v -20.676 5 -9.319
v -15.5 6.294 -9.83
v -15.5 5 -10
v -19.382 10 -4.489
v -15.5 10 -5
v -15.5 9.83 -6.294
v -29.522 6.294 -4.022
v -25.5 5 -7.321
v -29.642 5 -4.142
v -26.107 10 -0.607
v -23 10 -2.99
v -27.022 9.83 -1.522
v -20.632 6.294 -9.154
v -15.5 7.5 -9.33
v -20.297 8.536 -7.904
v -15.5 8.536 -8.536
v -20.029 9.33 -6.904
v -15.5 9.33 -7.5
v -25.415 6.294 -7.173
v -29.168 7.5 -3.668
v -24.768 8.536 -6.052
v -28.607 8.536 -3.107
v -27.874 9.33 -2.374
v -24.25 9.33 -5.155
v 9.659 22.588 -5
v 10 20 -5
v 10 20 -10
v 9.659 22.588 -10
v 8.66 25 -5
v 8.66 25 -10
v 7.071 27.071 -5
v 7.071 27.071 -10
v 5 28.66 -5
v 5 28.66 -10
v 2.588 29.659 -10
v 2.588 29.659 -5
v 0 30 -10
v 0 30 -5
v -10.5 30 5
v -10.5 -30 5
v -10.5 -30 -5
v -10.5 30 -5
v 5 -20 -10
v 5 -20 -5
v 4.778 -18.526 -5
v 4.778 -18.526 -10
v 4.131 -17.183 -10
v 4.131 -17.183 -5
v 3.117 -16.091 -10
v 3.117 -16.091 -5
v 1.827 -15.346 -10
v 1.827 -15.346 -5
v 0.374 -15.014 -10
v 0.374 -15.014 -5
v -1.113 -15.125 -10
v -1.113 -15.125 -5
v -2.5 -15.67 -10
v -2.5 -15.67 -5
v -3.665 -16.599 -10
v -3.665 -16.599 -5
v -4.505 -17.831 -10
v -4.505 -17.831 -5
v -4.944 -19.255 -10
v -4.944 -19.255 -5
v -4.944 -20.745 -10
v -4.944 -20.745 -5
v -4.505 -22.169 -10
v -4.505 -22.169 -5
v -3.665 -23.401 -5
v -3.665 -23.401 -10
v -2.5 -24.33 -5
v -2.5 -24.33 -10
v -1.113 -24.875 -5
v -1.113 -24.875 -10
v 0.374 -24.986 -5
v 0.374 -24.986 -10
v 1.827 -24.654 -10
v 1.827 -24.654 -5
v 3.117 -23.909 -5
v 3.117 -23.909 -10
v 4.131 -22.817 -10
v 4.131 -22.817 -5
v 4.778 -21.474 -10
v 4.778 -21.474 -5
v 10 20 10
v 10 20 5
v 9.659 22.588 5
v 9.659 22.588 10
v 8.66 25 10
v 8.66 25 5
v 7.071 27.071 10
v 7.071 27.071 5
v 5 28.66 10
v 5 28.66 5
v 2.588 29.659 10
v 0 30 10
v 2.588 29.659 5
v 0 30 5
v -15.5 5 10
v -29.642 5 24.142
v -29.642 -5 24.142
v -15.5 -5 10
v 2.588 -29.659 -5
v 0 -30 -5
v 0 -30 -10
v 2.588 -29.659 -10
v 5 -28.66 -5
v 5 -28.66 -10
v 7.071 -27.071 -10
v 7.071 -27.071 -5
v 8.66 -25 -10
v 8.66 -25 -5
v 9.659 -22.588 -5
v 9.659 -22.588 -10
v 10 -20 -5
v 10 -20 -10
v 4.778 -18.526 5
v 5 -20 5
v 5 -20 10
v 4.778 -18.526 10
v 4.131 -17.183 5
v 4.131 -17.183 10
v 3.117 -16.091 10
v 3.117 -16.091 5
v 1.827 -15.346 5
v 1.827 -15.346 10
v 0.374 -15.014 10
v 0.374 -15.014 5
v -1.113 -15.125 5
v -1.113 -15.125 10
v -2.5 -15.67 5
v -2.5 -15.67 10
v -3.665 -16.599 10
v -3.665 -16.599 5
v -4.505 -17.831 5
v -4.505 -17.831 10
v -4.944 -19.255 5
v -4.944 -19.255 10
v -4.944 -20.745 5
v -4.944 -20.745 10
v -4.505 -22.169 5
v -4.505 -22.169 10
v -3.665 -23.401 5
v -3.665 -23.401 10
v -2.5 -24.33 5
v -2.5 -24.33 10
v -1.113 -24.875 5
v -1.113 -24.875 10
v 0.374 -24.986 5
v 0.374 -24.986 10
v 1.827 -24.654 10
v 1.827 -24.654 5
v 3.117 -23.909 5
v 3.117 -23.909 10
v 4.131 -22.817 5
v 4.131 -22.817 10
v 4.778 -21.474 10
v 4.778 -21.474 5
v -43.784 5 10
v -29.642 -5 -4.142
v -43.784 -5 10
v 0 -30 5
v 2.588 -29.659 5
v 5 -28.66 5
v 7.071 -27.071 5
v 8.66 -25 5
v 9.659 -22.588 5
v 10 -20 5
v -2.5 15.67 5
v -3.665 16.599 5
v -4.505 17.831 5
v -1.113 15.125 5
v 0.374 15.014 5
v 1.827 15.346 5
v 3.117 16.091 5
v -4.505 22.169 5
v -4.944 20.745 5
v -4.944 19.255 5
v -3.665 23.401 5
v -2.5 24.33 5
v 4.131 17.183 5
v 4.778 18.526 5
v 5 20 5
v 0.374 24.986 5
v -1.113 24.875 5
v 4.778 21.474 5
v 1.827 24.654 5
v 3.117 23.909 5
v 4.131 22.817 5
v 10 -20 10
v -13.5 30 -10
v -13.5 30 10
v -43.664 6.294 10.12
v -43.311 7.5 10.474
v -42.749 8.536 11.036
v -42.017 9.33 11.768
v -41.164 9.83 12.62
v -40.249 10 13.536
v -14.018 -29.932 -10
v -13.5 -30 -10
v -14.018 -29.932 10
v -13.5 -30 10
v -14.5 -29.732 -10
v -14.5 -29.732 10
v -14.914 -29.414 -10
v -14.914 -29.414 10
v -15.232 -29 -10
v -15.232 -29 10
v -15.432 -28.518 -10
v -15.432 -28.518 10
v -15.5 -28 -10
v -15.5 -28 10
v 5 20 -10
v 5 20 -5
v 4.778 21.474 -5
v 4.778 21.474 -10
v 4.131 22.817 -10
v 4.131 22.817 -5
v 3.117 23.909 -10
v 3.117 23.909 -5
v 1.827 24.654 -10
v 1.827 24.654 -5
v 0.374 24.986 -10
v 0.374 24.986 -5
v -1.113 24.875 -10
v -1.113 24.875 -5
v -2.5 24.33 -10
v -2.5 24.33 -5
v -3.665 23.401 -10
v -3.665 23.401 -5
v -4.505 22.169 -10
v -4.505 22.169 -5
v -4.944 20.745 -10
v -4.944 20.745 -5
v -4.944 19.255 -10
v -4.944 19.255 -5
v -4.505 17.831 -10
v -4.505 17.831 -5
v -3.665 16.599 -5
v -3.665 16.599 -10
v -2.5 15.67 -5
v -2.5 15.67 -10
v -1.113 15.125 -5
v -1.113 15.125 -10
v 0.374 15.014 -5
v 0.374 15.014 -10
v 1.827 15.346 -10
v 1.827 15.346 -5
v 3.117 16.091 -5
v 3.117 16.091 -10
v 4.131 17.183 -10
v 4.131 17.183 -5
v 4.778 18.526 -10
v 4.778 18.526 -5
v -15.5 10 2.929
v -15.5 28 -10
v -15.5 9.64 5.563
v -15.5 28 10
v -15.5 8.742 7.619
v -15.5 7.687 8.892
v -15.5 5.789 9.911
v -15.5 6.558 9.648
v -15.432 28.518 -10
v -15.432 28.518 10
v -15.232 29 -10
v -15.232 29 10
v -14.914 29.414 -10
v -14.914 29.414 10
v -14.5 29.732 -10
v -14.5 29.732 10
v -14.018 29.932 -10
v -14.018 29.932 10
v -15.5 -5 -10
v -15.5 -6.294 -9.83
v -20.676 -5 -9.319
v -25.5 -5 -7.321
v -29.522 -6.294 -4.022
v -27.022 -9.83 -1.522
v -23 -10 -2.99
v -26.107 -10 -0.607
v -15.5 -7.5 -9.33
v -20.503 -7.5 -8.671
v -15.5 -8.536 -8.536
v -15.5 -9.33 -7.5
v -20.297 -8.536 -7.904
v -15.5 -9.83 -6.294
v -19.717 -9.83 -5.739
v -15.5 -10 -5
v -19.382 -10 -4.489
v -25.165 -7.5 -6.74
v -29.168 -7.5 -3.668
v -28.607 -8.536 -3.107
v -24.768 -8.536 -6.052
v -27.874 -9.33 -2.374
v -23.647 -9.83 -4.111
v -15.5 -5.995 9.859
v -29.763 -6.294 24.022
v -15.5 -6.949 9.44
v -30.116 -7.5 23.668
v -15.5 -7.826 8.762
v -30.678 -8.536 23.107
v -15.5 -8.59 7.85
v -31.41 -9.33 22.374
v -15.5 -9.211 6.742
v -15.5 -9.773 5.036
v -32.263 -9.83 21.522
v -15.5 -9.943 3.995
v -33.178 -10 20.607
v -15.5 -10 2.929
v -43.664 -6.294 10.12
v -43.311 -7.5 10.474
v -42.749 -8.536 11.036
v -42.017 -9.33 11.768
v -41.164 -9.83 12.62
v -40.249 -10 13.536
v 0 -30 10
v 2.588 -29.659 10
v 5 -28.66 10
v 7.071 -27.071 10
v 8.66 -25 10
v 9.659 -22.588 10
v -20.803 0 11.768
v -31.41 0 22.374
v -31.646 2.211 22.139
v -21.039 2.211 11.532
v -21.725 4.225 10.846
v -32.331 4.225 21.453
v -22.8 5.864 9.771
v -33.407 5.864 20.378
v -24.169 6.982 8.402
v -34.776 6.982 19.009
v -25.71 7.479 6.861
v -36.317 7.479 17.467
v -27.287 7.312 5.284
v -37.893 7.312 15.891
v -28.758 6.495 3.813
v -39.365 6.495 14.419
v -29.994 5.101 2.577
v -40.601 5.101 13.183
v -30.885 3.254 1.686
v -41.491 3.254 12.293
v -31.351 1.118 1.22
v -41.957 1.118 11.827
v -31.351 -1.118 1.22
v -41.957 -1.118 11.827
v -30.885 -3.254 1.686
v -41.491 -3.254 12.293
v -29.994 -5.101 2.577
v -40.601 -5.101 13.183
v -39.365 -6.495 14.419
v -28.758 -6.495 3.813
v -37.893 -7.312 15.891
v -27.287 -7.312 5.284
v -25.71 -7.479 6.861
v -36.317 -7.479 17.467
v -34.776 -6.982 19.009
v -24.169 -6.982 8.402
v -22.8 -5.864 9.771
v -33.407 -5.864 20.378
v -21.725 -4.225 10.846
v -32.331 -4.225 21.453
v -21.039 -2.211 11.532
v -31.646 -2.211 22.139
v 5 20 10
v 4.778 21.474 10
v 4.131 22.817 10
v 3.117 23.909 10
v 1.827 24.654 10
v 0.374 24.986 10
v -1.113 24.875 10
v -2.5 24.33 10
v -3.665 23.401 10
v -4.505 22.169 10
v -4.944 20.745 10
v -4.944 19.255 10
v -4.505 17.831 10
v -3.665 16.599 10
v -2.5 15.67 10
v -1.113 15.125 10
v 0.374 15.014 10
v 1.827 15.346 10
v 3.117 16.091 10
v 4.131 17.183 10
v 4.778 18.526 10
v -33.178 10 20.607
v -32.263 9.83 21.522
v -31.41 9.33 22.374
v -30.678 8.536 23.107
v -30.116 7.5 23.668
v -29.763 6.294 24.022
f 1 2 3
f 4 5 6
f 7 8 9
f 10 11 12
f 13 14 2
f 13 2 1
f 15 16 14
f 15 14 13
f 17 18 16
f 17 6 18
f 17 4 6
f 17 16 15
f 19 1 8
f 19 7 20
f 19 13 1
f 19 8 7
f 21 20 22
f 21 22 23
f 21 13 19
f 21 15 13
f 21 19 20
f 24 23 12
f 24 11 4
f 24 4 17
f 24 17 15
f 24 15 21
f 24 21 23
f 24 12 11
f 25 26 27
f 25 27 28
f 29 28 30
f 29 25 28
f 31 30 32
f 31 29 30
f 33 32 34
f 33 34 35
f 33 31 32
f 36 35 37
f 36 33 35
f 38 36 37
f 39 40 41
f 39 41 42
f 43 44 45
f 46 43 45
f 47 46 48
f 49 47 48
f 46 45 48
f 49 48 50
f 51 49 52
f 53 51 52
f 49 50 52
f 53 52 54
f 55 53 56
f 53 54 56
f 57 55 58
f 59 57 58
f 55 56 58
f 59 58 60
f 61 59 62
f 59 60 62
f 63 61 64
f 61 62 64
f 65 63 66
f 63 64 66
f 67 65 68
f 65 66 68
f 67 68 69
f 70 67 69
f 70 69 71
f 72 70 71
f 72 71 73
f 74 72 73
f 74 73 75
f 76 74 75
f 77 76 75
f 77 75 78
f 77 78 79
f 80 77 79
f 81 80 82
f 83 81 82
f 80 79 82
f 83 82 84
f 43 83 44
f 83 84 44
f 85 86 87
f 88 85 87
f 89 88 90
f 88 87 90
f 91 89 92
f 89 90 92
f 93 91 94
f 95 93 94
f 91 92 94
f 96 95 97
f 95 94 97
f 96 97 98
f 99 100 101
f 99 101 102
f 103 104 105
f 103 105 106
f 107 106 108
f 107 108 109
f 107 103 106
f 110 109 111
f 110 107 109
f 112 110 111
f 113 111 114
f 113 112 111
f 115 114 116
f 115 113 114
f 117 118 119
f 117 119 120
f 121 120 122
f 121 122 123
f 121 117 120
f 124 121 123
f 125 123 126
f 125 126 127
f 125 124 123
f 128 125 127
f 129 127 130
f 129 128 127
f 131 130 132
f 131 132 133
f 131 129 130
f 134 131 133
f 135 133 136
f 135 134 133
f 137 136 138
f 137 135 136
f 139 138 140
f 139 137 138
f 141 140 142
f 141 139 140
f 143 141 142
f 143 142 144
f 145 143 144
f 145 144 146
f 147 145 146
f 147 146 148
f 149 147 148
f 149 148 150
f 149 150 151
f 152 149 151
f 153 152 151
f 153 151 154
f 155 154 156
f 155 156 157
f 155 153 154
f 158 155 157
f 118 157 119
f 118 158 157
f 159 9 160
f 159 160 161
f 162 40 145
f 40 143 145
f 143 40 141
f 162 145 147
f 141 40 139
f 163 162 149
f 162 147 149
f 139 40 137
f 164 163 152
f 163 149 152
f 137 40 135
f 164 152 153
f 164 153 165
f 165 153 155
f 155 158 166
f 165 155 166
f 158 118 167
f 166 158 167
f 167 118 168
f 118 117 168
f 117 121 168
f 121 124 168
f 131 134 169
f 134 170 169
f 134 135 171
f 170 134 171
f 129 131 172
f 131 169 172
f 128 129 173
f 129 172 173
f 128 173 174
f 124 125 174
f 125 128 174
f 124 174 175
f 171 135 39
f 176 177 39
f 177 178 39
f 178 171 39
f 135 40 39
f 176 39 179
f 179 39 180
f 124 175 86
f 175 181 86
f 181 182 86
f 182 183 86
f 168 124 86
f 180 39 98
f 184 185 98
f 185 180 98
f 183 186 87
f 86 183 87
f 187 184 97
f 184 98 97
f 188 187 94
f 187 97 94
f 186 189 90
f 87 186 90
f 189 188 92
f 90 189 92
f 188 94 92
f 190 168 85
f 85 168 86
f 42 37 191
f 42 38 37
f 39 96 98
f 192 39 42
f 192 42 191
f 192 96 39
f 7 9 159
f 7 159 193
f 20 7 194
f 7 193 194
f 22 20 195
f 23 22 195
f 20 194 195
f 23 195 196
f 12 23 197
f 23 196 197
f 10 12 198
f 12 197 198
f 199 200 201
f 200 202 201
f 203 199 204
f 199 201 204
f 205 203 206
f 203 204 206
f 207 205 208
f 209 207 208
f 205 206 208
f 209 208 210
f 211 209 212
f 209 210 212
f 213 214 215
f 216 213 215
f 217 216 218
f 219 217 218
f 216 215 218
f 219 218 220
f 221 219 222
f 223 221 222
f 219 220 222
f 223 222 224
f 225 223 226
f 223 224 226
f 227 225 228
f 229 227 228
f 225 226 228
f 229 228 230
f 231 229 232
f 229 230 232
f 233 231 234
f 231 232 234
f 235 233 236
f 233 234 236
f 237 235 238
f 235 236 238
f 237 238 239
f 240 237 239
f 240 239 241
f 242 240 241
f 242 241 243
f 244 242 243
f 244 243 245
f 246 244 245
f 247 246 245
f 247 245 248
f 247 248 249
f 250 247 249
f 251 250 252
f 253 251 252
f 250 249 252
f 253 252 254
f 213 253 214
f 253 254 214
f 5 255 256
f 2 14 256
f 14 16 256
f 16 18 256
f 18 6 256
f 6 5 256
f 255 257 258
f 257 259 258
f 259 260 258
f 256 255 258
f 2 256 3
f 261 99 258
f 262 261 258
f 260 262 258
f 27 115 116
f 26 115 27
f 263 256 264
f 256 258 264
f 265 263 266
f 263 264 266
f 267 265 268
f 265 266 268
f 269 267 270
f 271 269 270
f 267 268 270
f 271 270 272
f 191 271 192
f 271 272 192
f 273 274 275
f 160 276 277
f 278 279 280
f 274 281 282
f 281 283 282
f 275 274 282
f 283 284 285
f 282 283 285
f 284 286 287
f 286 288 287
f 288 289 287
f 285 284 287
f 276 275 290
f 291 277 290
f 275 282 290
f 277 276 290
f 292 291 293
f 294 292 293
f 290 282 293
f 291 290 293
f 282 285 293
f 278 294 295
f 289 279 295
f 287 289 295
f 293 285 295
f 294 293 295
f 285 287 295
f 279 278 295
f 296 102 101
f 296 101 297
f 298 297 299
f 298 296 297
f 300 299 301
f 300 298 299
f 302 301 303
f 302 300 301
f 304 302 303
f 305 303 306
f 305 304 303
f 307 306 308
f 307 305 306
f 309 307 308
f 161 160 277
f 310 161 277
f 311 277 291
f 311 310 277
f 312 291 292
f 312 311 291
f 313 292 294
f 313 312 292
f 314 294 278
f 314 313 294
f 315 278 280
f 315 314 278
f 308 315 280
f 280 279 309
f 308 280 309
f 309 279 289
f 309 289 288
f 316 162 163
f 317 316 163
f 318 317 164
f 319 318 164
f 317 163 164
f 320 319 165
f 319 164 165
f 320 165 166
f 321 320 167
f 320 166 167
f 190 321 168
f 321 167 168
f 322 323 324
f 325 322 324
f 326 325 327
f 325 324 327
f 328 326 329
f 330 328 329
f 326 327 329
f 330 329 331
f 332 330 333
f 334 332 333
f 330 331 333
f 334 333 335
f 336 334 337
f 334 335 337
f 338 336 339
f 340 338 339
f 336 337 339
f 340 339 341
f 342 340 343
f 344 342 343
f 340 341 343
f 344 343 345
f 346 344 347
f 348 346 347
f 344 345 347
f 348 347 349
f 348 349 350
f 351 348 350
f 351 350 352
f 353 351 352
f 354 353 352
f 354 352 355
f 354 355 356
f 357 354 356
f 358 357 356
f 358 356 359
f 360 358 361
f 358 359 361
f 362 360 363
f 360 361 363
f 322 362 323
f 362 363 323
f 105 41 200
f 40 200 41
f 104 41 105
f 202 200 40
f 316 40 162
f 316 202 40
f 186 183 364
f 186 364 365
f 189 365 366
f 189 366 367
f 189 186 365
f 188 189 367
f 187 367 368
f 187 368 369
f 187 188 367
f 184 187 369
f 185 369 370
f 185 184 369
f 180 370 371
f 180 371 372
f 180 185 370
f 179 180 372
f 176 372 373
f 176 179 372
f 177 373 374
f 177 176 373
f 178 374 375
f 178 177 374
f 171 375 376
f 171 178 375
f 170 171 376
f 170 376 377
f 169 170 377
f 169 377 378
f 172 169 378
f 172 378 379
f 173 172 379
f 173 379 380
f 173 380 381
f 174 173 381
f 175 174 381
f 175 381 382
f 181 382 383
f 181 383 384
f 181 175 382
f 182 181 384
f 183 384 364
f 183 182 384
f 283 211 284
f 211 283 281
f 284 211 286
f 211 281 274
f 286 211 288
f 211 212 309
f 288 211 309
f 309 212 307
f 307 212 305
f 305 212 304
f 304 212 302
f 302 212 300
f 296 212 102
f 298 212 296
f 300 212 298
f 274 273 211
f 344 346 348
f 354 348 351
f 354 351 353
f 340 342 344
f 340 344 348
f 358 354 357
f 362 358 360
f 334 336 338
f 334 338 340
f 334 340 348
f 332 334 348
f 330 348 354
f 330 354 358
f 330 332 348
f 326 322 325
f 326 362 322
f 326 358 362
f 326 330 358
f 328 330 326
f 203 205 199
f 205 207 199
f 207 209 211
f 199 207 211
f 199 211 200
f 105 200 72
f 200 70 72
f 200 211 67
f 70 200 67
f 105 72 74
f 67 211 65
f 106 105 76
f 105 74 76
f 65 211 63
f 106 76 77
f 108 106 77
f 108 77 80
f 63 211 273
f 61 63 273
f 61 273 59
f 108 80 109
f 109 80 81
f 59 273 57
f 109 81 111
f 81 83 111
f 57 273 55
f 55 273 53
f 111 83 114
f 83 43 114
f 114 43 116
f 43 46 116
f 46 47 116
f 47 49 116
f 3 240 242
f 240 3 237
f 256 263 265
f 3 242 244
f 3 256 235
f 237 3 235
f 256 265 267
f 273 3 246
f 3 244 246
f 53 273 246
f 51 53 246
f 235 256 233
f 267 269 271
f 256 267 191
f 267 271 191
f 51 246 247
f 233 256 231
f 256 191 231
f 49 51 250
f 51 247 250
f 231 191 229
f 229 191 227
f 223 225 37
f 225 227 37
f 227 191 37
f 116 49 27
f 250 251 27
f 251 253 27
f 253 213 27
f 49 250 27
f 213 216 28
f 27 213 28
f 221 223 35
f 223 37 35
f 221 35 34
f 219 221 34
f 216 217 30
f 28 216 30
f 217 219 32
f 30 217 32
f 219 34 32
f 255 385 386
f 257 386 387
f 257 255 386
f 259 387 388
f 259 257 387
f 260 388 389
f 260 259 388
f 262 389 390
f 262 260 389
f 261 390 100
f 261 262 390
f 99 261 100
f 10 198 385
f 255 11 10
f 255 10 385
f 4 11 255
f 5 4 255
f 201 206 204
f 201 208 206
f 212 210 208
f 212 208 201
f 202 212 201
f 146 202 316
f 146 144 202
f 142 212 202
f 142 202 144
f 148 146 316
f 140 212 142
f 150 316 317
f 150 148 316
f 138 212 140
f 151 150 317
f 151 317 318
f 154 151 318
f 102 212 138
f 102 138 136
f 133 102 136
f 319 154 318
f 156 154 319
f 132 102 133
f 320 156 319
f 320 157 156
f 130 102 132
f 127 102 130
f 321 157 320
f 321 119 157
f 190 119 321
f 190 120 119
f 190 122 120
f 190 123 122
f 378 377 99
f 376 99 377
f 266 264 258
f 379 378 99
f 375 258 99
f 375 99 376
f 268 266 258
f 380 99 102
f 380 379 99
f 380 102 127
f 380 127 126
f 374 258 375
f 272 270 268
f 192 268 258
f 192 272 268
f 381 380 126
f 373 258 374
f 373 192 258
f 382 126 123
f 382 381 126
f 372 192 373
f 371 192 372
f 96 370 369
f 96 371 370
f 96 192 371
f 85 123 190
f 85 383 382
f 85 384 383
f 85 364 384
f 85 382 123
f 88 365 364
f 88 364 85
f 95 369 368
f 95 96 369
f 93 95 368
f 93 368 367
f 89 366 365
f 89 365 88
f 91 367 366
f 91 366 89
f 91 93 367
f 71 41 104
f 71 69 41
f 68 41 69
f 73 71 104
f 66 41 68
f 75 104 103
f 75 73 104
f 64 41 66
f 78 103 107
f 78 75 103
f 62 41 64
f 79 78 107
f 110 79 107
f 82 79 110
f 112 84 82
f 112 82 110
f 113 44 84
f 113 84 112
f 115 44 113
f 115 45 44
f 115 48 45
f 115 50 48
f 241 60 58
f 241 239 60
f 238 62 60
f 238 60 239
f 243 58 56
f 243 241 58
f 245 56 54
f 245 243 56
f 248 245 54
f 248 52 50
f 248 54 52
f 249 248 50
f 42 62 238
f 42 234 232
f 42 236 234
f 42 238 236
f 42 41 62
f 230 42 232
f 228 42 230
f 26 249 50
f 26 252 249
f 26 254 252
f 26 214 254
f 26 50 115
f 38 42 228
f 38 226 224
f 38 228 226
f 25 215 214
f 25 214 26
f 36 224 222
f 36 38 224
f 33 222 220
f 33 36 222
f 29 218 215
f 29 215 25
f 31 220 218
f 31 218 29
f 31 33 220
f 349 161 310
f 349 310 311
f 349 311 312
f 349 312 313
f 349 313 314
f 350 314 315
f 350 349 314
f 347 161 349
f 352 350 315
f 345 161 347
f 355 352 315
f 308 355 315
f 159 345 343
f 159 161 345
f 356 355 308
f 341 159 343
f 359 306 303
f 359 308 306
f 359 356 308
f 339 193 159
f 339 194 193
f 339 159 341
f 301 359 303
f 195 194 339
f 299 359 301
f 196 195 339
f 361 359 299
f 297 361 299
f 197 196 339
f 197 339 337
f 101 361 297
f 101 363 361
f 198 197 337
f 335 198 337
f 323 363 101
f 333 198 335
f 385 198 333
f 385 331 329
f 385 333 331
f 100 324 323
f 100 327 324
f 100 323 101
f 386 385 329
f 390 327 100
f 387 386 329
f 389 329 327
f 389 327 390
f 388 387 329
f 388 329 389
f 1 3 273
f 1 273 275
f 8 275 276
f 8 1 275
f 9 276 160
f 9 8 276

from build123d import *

# Parameters (mm, degrees)
SKETCH1_W           = 5
SKETCH1_H           = 60
BOSS_EXTRUDE1_DEPTH = 5
BOSS_EXTRUDE2_START = 5
SKETCH1_3_R         = 5
SKETCH1_3_W         = 5
SKETCH1_3_H         = 60
BOSS_EXTRUDE2_DEPTH = 5
BOSS_EXTRUDE3_START = -5
SKETCH1_4_R         = 5
SKETCH1_4_W         = 5
SKETCH1_4_H         = 60
BOSS_EXTRUDE3_DEPTH = 5
BOSS_EXTRUDE4_DEPTH = 10
FILLET3_R           = 5
FILLET2_R           = 2
SKETCH4_R           = 7.5
CUT_EXTRUDE1_DEPTH  = 15


with BuildPart() as part:
    # Sketch1 → Boss-Extrude1 (new body, symmetric)
    with BuildSketch(Plane.XY):
        with Locations((-13, 0)):
            Rectangle(SKETCH1_W, SKETCH1_H)
    extrude(amount=BOSS_EXTRUDE1_DEPTH, both=True)

    # Sketch1<3> → Boss-Extrude2 (add)
    with BuildSketch(Plane.XY.offset(BOSS_EXTRUDE2_START)):
        with BuildLine():
            Line((0, 30), (-10.5, 30))
            Line((-10.5, 30), (-10.5, -30))
            Line((-10.5, -30), (0, -30))
            ThreePointArc((0, -30), (7.071067812, -27.071067812), (10, -20))
            Line((10, -20), (10, 20))
            ThreePointArc((10, 20), (7.071067812, 27.071067812), (0, 30))
        make_face()
        with Locations((0, -20)):
            Circle(SKETCH1_3_R, mode=Mode.SUBTRACT)
        with Locations((0, 20)):
            Circle(SKETCH1_3_R, mode=Mode.SUBTRACT)
        with Locations((-13, 0)):
            Rectangle(SKETCH1_3_W, SKETCH1_3_H)
    extrude(amount=BOSS_EXTRUDE2_DEPTH)

    # Sketch1<4> → Boss-Extrude3 (add)
    with BuildSketch(Plane.XY.offset(BOSS_EXTRUDE3_START)):
        with BuildLine():
            Line((0, 30), (-10.5, 30))
            Line((-10.5, 30), (-10.5, -30))
            Line((-10.5, -30), (0, -30))
            ThreePointArc((0, -30), (7.071067812, -27.071067812), (10, -20))
            Line((10, -20), (10, 20))
            ThreePointArc((10, 20), (7.071067812, 27.071067812), (0, 30))
        make_face()
        with Locations((0, -20)):
            Circle(SKETCH1_4_R, mode=Mode.SUBTRACT)
        with Locations((0, 20)):
            Circle(SKETCH1_4_R, mode=Mode.SUBTRACT)
        with Locations((-13, 0)):
            Rectangle(SKETCH1_4_W, SKETCH1_4_H)
    extrude(amount=-BOSS_EXTRUDE3_DEPTH)

    # Sketch3 → Boss-Extrude4 (add, symmetric)
    with BuildSketch(Plane(origin=(0, 0, 0), x_dir=(1, 0, 0), z_dir=(0, 1, 0))):
        with BuildLine():
            Line((-15.5, -10), (-15.5, 10))
            ThreePointArc((-15.5, 10), (-23.153668647, 8.47759065), (-29.642135624, 4.142135624))
            Line((-29.642135624, 4.142135624), (-43.784271247, -10))
            Line((-43.784271247, -10), (-29.642135624, -24.142135624))
            Line((-29.642135624, -24.142135624), (-15.5, -10))
        make_face()
    extrude(amount=BOSS_EXTRUDE4_DEPTH, both=True)

    # Fillet3
    fillet3_edges = [part.edges().sort_by_distance(p)[0] for p in [
        (-22.571067812, -10, 17.071067812),
        (-23.153668647, -10, -8.47759065),
        (-36.713203436, -10, 2.928932188),
        (-22.571067812, 10, 17.071067812),
        (-23.153668647, 10, -8.47759065),
        (-36.713203436, 10, 2.928932188),
    ]]
    fillet(fillet3_edges, radius=FILLET3_R)

    # Fillet2
    fillet2_edges = [part.edges().sort_by_distance(p)[0] for p in [
        (-15.5, 30, 0),
        (-15.5, -30, 0),
    ]]
    fillet(fillet2_edges, radius=FILLET2_R)

    # Sketch4 → Cut-Extrude1 (cut)
    with BuildSketch(Plane(origin=(-26.892135624, 0, 26.892135624), x_dir=(0.707106781, 0, 0.707106781), z_dir=(-0.707106781, 0, 0.707106781))):
        with Locations((-13.889087297, 0)):
            Circle(SKETCH4_R)
    extrude(amount=-CUT_EXTRUDE1_DEPTH, mode=Mode.SUBTRACT)


solid = part.part
